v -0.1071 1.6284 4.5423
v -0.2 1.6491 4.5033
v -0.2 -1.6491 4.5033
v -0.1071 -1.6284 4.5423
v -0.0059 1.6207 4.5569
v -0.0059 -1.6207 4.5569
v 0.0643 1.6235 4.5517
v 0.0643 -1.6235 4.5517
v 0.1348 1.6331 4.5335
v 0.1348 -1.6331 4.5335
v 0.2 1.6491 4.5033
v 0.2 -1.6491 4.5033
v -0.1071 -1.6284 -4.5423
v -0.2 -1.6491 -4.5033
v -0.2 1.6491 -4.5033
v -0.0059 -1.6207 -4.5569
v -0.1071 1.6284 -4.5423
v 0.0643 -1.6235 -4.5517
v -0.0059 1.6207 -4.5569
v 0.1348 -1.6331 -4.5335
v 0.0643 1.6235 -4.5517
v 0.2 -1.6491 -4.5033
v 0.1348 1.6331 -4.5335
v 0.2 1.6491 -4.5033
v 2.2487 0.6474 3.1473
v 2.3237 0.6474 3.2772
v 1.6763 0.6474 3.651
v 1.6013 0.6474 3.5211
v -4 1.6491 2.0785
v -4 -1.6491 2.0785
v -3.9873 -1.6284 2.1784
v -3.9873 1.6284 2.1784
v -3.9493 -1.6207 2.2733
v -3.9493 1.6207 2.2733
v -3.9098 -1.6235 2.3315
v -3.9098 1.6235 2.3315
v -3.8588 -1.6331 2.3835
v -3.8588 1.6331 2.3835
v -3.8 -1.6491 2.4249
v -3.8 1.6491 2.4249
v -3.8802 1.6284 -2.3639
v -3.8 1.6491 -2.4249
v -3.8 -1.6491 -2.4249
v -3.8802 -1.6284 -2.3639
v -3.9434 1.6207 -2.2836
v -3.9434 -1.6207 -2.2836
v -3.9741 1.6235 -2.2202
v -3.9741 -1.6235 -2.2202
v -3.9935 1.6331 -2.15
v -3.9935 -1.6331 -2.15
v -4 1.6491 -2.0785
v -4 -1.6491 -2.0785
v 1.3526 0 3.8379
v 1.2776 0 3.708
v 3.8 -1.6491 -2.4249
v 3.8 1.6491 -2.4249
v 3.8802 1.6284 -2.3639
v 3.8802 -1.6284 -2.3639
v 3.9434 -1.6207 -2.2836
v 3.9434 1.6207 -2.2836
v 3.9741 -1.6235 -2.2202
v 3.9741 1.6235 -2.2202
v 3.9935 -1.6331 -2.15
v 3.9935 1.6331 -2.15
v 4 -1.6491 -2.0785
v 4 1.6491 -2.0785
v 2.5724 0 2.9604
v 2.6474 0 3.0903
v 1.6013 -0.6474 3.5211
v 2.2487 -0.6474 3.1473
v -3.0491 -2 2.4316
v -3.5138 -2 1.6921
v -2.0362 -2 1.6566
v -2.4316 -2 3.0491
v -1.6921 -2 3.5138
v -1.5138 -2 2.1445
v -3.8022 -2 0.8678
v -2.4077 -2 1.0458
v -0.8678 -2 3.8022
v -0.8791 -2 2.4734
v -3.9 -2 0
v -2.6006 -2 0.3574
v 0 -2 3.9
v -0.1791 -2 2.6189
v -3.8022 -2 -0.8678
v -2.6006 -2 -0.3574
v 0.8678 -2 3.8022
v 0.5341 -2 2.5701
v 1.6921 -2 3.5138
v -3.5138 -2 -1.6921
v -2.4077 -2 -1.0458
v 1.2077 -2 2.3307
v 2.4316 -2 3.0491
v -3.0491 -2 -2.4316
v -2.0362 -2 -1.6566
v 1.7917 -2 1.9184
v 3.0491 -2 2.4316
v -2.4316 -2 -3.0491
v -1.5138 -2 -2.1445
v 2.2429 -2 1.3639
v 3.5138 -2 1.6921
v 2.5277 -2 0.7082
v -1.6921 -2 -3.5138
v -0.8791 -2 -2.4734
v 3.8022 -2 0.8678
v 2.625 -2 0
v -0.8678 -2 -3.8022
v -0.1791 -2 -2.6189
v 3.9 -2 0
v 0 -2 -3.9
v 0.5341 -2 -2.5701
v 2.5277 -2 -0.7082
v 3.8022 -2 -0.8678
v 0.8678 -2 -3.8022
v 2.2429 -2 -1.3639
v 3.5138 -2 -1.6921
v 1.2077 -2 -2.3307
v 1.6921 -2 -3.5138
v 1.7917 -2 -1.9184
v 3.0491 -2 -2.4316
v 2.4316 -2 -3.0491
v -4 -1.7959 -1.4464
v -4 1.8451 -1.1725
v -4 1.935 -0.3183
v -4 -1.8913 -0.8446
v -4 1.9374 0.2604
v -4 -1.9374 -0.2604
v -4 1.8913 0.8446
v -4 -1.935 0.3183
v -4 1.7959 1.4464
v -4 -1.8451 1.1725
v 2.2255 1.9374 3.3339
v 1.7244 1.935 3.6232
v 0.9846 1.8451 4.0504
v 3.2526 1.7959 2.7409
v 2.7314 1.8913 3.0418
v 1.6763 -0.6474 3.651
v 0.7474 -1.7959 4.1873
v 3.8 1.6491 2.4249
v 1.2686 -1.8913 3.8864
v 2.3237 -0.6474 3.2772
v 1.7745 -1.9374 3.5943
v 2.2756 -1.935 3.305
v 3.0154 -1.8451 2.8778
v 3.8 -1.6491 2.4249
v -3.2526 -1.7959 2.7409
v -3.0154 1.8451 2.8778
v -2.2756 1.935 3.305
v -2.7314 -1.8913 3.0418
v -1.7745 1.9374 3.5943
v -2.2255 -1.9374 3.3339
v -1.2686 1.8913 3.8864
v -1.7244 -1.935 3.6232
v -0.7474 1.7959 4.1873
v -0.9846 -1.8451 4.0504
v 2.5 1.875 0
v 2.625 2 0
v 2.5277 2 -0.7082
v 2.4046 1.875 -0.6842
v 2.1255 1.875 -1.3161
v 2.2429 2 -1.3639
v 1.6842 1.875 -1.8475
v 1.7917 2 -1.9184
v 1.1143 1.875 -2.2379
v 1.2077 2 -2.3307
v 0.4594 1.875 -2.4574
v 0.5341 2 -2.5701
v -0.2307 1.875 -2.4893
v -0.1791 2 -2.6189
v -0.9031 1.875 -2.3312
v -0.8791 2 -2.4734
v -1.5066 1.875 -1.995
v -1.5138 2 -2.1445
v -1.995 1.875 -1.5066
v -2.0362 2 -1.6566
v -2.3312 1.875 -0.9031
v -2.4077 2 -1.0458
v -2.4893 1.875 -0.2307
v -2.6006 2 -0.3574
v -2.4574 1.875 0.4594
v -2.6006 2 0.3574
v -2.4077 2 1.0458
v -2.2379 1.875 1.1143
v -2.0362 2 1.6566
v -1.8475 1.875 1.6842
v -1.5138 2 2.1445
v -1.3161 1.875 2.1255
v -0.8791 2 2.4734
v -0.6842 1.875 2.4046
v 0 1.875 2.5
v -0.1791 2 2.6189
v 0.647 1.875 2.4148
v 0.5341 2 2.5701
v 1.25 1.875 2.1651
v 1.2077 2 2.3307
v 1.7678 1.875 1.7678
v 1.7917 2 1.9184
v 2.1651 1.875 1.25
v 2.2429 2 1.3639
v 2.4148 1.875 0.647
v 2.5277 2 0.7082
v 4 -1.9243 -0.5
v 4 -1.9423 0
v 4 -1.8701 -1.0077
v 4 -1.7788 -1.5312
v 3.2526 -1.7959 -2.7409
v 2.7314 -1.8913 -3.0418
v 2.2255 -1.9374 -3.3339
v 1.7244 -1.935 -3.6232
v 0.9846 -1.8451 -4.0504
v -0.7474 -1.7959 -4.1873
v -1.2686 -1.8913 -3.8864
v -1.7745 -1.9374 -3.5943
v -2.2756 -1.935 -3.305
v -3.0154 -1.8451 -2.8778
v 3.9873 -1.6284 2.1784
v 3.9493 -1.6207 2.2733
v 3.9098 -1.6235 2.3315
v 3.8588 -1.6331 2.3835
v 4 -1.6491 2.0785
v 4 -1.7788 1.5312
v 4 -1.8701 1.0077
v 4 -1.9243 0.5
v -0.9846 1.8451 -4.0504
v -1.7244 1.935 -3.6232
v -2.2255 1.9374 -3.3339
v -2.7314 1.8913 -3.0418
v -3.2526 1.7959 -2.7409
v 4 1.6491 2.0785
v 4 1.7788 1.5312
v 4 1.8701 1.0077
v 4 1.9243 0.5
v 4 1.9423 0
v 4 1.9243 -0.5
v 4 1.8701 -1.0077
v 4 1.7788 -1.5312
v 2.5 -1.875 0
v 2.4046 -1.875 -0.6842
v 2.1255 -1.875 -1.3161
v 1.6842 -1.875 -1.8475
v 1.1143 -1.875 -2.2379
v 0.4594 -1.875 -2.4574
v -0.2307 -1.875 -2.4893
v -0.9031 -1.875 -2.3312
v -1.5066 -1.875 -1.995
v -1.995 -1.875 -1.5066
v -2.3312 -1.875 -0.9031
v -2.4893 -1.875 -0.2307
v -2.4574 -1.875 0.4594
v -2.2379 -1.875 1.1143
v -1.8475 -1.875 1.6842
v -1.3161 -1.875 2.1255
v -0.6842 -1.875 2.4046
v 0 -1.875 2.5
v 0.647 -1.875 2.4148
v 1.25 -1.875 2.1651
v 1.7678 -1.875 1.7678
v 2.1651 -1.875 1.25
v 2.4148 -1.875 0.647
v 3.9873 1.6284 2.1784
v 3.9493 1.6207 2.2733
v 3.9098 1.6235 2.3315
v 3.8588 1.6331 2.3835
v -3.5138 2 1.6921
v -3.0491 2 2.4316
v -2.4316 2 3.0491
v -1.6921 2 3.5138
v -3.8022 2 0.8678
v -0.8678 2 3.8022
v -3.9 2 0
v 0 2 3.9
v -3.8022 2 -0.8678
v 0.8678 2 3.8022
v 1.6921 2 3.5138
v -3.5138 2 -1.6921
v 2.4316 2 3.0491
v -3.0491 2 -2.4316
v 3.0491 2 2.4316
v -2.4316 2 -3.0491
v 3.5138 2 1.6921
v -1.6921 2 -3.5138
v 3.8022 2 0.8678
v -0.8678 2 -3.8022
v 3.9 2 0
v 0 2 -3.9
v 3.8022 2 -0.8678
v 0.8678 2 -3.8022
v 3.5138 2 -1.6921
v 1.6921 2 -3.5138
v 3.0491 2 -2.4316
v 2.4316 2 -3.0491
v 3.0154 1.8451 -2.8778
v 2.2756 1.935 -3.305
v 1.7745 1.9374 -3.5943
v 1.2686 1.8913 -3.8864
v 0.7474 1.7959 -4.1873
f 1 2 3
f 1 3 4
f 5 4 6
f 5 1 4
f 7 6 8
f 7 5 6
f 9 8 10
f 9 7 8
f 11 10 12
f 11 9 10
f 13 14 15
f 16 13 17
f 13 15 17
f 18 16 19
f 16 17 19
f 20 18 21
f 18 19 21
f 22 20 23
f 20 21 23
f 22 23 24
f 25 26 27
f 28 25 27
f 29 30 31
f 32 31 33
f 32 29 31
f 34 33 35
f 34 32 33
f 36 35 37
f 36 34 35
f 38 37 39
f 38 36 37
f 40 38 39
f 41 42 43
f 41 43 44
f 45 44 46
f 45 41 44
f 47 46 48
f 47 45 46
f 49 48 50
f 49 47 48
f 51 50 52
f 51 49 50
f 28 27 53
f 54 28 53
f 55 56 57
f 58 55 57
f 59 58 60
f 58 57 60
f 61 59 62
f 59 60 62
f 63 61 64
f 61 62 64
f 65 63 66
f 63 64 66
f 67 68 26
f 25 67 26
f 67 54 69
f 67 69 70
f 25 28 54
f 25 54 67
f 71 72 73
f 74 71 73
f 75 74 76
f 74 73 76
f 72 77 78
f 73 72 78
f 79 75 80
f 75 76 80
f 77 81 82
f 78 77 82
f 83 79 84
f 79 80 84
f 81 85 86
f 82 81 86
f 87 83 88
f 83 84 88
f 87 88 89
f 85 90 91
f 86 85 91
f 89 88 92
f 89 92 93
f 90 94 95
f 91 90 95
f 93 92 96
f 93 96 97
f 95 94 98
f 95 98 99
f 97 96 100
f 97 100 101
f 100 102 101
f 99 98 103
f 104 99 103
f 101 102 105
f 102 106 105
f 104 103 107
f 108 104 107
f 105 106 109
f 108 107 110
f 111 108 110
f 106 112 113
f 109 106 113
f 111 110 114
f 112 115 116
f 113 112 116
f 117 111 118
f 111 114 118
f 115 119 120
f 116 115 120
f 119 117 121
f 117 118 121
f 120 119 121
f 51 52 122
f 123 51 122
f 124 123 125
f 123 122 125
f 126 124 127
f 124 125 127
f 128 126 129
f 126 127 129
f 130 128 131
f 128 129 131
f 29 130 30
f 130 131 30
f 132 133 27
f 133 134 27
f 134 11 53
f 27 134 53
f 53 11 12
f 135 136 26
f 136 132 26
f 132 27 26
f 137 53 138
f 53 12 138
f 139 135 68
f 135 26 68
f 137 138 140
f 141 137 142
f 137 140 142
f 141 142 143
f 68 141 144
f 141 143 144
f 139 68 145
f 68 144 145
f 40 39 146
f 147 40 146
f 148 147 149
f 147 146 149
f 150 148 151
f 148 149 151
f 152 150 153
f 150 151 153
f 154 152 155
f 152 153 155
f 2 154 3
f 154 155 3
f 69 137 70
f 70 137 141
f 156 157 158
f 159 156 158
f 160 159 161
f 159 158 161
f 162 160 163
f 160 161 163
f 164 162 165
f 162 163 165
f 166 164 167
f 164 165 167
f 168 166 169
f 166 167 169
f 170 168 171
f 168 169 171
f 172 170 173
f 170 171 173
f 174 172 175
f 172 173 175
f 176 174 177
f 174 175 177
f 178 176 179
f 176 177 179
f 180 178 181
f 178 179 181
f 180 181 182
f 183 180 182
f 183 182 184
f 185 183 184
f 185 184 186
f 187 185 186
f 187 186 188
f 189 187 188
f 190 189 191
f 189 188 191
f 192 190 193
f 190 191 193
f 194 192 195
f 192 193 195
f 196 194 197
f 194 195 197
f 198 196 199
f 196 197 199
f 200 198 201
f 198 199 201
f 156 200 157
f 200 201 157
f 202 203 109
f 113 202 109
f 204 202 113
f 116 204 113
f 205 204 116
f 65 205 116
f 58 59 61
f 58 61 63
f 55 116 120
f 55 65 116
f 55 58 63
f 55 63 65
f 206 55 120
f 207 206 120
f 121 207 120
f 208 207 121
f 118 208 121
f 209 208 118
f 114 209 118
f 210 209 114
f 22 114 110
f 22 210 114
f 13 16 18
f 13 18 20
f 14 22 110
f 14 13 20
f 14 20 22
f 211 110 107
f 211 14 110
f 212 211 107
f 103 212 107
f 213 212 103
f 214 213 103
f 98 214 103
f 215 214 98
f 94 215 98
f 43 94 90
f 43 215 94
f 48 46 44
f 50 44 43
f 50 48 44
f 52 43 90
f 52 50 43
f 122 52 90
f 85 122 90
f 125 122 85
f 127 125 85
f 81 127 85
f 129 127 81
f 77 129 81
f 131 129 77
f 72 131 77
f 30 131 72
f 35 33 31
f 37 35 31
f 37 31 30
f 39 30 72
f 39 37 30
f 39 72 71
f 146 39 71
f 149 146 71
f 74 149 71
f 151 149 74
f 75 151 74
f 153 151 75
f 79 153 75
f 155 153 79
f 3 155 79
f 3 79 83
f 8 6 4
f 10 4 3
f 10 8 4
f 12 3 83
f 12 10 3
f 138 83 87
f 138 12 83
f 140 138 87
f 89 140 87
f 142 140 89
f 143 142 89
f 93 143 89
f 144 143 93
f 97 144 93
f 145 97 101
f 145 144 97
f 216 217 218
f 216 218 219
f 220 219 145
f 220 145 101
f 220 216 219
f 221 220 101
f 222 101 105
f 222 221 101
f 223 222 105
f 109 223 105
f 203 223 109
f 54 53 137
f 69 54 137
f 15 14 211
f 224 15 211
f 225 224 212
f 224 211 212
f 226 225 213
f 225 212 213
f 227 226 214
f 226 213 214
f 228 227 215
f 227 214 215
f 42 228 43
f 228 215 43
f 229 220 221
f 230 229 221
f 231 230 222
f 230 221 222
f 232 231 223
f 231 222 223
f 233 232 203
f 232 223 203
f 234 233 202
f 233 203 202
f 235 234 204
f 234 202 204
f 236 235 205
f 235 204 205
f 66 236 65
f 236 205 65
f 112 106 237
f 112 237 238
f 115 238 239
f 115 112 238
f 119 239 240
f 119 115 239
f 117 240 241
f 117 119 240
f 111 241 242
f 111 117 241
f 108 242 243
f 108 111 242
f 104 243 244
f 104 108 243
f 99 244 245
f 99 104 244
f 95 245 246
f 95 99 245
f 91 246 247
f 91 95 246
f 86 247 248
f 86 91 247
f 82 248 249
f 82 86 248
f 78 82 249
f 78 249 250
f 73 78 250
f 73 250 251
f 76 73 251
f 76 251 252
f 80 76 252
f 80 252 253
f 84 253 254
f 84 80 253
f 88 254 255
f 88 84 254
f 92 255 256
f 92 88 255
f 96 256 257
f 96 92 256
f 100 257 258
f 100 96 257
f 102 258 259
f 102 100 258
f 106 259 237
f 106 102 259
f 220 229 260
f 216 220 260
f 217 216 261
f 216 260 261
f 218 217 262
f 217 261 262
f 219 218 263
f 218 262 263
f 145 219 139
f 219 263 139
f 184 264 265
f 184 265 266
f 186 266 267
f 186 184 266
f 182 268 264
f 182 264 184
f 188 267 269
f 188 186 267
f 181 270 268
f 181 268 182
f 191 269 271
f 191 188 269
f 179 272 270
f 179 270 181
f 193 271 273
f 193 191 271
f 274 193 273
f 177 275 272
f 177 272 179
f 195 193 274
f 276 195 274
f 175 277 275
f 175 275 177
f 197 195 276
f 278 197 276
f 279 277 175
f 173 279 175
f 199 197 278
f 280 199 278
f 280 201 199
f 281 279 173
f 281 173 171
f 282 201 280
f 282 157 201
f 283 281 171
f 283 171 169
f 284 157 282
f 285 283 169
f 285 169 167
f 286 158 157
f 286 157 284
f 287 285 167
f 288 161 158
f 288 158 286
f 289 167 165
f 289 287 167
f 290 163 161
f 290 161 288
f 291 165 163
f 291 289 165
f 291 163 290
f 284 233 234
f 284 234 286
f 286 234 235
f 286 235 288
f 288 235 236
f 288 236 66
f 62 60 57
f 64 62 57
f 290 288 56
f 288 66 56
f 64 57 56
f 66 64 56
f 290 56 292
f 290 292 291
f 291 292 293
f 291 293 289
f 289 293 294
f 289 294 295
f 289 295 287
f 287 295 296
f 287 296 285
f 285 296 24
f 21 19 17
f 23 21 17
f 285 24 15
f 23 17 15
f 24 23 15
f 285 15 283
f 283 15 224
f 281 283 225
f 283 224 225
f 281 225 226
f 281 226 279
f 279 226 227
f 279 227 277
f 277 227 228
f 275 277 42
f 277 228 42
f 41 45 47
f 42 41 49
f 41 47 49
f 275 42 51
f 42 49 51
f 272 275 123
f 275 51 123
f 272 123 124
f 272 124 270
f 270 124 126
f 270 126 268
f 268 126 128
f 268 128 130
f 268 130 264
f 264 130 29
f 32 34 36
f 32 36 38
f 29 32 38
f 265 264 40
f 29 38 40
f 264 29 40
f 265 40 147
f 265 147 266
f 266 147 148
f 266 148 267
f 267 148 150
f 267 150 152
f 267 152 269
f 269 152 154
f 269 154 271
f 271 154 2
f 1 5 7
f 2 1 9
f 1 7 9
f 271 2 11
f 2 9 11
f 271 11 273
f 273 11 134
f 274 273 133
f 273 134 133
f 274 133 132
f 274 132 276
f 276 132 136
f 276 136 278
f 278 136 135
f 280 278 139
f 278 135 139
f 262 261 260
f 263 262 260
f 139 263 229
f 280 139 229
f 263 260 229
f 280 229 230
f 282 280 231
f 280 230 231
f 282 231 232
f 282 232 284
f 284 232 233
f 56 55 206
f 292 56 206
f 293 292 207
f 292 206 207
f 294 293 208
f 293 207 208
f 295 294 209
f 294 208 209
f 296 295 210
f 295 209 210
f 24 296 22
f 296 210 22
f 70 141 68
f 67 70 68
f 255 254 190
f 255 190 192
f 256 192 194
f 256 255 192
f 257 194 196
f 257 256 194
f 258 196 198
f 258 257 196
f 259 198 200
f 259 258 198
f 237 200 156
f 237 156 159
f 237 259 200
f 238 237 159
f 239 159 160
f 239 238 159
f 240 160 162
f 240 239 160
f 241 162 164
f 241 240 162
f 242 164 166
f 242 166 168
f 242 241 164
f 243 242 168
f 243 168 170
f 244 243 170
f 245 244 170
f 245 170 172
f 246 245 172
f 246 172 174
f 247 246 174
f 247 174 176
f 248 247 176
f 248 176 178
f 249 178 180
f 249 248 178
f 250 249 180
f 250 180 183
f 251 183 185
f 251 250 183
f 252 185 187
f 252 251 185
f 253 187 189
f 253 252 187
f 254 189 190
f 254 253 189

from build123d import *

# Parameters (mm, degrees)
BOSS_EXTRUDE1_DEPTH      = 2
BOSS_EXTRUDE1_DEPTH_BACK = 2
SKETCH2_R                = 2.5
FILLET1_R                = 0.4
CUT_EXTRUDE2_DEPTH       = 0.15


with BuildPart() as part:
    # Sketch2 → Boss-Extrude1 (new, two sides: drawn at the far end of the back side and taken through both)
    with BuildSketch(Plane(origin=(0, 0, 0), x_dir=(1, 0, 0), z_dir=(0, 1, 0)).offset(-BOSS_EXTRUDE1_DEPTH_BACK)):
        Polygon((0, 4.618802154), (-4, 2.309401077), (-4, -2.309401077), (0, -4.618802154), (4, -2.309401077), (4, 2.309401077), align=None)
        with Locations(Location((0, 0, 0), (0, 0, 270))):
            Circle(SKETCH2_R, mode=Mode.SUBTRACT)
    extrude(amount=BOSS_EXTRUDE1_DEPTH + BOSS_EXTRUDE1_DEPTH_BACK)

    # Fillet1
    fillet1_edges = [part.edges().sort_by_distance(p)[0] for p in [
        (4, 0, -2.309401077),
        (4, 0, 2.309401077),
        (0, 0, 4.618802154),
        (-4, 0, 2.309401077),
        (-4, 0, -2.309401077),
        (0, 0, -4.618802154),
    ]]
    fillet(fillet1_edges, radius=FILLET1_R)

    # Sketch3 → Cut-Revolve2 (revolve, cut)
    with BuildSketch(Plane(origin=(0, 0, 0), x_dir=(0, 0, -1), z_dir=(1, 0, 0)), mode=Mode.PRIVATE) as cut_revolve2_sk:
        Polygon((3.9, -2), (4.618802154, -1.584999383), (4.618802154, -2), align=None)
        Polygon((2.5, 2), (2.5, 1.875), (2.625, 2), align=None)
        Polygon((2.5, -2), (2.5, -1.875), (2.625, -2), align=None)
        Polygon((3.9, 2), (4.618802154, 1.584999383), (4.618802154, 2), align=None)
    revolve(cut_revolve2_sk.sketch.rotate(Axis((0, -2, 0), (0, 1, 0)), 270), axis=Axis((0, -2, 0), (0, 1, 0)), mode=Mode.SUBTRACT)

    # Sketch12 → Cut-Extrude2 (cut)
    with BuildSketch(Plane(origin=(2, 0, 3.464101615), x_dir=(0.8660254037844384, 0, -0.5000000000000006), z_dir=(0.5000000000000006, 0, 0.8660254037844385))):
        Polygon((-0.747578096, 0), (-0.373789048, -0.647421623), (0.373789048, -0.647421623), (0.747578096, 0), (0.373789048, 0.647421623), (-0.373789048, 0.647421623), align=None)
    extrude(amount=-CUT_EXTRUDE2_DEPTH, mode=Mode.SUBTRACT)


solid = part.part
